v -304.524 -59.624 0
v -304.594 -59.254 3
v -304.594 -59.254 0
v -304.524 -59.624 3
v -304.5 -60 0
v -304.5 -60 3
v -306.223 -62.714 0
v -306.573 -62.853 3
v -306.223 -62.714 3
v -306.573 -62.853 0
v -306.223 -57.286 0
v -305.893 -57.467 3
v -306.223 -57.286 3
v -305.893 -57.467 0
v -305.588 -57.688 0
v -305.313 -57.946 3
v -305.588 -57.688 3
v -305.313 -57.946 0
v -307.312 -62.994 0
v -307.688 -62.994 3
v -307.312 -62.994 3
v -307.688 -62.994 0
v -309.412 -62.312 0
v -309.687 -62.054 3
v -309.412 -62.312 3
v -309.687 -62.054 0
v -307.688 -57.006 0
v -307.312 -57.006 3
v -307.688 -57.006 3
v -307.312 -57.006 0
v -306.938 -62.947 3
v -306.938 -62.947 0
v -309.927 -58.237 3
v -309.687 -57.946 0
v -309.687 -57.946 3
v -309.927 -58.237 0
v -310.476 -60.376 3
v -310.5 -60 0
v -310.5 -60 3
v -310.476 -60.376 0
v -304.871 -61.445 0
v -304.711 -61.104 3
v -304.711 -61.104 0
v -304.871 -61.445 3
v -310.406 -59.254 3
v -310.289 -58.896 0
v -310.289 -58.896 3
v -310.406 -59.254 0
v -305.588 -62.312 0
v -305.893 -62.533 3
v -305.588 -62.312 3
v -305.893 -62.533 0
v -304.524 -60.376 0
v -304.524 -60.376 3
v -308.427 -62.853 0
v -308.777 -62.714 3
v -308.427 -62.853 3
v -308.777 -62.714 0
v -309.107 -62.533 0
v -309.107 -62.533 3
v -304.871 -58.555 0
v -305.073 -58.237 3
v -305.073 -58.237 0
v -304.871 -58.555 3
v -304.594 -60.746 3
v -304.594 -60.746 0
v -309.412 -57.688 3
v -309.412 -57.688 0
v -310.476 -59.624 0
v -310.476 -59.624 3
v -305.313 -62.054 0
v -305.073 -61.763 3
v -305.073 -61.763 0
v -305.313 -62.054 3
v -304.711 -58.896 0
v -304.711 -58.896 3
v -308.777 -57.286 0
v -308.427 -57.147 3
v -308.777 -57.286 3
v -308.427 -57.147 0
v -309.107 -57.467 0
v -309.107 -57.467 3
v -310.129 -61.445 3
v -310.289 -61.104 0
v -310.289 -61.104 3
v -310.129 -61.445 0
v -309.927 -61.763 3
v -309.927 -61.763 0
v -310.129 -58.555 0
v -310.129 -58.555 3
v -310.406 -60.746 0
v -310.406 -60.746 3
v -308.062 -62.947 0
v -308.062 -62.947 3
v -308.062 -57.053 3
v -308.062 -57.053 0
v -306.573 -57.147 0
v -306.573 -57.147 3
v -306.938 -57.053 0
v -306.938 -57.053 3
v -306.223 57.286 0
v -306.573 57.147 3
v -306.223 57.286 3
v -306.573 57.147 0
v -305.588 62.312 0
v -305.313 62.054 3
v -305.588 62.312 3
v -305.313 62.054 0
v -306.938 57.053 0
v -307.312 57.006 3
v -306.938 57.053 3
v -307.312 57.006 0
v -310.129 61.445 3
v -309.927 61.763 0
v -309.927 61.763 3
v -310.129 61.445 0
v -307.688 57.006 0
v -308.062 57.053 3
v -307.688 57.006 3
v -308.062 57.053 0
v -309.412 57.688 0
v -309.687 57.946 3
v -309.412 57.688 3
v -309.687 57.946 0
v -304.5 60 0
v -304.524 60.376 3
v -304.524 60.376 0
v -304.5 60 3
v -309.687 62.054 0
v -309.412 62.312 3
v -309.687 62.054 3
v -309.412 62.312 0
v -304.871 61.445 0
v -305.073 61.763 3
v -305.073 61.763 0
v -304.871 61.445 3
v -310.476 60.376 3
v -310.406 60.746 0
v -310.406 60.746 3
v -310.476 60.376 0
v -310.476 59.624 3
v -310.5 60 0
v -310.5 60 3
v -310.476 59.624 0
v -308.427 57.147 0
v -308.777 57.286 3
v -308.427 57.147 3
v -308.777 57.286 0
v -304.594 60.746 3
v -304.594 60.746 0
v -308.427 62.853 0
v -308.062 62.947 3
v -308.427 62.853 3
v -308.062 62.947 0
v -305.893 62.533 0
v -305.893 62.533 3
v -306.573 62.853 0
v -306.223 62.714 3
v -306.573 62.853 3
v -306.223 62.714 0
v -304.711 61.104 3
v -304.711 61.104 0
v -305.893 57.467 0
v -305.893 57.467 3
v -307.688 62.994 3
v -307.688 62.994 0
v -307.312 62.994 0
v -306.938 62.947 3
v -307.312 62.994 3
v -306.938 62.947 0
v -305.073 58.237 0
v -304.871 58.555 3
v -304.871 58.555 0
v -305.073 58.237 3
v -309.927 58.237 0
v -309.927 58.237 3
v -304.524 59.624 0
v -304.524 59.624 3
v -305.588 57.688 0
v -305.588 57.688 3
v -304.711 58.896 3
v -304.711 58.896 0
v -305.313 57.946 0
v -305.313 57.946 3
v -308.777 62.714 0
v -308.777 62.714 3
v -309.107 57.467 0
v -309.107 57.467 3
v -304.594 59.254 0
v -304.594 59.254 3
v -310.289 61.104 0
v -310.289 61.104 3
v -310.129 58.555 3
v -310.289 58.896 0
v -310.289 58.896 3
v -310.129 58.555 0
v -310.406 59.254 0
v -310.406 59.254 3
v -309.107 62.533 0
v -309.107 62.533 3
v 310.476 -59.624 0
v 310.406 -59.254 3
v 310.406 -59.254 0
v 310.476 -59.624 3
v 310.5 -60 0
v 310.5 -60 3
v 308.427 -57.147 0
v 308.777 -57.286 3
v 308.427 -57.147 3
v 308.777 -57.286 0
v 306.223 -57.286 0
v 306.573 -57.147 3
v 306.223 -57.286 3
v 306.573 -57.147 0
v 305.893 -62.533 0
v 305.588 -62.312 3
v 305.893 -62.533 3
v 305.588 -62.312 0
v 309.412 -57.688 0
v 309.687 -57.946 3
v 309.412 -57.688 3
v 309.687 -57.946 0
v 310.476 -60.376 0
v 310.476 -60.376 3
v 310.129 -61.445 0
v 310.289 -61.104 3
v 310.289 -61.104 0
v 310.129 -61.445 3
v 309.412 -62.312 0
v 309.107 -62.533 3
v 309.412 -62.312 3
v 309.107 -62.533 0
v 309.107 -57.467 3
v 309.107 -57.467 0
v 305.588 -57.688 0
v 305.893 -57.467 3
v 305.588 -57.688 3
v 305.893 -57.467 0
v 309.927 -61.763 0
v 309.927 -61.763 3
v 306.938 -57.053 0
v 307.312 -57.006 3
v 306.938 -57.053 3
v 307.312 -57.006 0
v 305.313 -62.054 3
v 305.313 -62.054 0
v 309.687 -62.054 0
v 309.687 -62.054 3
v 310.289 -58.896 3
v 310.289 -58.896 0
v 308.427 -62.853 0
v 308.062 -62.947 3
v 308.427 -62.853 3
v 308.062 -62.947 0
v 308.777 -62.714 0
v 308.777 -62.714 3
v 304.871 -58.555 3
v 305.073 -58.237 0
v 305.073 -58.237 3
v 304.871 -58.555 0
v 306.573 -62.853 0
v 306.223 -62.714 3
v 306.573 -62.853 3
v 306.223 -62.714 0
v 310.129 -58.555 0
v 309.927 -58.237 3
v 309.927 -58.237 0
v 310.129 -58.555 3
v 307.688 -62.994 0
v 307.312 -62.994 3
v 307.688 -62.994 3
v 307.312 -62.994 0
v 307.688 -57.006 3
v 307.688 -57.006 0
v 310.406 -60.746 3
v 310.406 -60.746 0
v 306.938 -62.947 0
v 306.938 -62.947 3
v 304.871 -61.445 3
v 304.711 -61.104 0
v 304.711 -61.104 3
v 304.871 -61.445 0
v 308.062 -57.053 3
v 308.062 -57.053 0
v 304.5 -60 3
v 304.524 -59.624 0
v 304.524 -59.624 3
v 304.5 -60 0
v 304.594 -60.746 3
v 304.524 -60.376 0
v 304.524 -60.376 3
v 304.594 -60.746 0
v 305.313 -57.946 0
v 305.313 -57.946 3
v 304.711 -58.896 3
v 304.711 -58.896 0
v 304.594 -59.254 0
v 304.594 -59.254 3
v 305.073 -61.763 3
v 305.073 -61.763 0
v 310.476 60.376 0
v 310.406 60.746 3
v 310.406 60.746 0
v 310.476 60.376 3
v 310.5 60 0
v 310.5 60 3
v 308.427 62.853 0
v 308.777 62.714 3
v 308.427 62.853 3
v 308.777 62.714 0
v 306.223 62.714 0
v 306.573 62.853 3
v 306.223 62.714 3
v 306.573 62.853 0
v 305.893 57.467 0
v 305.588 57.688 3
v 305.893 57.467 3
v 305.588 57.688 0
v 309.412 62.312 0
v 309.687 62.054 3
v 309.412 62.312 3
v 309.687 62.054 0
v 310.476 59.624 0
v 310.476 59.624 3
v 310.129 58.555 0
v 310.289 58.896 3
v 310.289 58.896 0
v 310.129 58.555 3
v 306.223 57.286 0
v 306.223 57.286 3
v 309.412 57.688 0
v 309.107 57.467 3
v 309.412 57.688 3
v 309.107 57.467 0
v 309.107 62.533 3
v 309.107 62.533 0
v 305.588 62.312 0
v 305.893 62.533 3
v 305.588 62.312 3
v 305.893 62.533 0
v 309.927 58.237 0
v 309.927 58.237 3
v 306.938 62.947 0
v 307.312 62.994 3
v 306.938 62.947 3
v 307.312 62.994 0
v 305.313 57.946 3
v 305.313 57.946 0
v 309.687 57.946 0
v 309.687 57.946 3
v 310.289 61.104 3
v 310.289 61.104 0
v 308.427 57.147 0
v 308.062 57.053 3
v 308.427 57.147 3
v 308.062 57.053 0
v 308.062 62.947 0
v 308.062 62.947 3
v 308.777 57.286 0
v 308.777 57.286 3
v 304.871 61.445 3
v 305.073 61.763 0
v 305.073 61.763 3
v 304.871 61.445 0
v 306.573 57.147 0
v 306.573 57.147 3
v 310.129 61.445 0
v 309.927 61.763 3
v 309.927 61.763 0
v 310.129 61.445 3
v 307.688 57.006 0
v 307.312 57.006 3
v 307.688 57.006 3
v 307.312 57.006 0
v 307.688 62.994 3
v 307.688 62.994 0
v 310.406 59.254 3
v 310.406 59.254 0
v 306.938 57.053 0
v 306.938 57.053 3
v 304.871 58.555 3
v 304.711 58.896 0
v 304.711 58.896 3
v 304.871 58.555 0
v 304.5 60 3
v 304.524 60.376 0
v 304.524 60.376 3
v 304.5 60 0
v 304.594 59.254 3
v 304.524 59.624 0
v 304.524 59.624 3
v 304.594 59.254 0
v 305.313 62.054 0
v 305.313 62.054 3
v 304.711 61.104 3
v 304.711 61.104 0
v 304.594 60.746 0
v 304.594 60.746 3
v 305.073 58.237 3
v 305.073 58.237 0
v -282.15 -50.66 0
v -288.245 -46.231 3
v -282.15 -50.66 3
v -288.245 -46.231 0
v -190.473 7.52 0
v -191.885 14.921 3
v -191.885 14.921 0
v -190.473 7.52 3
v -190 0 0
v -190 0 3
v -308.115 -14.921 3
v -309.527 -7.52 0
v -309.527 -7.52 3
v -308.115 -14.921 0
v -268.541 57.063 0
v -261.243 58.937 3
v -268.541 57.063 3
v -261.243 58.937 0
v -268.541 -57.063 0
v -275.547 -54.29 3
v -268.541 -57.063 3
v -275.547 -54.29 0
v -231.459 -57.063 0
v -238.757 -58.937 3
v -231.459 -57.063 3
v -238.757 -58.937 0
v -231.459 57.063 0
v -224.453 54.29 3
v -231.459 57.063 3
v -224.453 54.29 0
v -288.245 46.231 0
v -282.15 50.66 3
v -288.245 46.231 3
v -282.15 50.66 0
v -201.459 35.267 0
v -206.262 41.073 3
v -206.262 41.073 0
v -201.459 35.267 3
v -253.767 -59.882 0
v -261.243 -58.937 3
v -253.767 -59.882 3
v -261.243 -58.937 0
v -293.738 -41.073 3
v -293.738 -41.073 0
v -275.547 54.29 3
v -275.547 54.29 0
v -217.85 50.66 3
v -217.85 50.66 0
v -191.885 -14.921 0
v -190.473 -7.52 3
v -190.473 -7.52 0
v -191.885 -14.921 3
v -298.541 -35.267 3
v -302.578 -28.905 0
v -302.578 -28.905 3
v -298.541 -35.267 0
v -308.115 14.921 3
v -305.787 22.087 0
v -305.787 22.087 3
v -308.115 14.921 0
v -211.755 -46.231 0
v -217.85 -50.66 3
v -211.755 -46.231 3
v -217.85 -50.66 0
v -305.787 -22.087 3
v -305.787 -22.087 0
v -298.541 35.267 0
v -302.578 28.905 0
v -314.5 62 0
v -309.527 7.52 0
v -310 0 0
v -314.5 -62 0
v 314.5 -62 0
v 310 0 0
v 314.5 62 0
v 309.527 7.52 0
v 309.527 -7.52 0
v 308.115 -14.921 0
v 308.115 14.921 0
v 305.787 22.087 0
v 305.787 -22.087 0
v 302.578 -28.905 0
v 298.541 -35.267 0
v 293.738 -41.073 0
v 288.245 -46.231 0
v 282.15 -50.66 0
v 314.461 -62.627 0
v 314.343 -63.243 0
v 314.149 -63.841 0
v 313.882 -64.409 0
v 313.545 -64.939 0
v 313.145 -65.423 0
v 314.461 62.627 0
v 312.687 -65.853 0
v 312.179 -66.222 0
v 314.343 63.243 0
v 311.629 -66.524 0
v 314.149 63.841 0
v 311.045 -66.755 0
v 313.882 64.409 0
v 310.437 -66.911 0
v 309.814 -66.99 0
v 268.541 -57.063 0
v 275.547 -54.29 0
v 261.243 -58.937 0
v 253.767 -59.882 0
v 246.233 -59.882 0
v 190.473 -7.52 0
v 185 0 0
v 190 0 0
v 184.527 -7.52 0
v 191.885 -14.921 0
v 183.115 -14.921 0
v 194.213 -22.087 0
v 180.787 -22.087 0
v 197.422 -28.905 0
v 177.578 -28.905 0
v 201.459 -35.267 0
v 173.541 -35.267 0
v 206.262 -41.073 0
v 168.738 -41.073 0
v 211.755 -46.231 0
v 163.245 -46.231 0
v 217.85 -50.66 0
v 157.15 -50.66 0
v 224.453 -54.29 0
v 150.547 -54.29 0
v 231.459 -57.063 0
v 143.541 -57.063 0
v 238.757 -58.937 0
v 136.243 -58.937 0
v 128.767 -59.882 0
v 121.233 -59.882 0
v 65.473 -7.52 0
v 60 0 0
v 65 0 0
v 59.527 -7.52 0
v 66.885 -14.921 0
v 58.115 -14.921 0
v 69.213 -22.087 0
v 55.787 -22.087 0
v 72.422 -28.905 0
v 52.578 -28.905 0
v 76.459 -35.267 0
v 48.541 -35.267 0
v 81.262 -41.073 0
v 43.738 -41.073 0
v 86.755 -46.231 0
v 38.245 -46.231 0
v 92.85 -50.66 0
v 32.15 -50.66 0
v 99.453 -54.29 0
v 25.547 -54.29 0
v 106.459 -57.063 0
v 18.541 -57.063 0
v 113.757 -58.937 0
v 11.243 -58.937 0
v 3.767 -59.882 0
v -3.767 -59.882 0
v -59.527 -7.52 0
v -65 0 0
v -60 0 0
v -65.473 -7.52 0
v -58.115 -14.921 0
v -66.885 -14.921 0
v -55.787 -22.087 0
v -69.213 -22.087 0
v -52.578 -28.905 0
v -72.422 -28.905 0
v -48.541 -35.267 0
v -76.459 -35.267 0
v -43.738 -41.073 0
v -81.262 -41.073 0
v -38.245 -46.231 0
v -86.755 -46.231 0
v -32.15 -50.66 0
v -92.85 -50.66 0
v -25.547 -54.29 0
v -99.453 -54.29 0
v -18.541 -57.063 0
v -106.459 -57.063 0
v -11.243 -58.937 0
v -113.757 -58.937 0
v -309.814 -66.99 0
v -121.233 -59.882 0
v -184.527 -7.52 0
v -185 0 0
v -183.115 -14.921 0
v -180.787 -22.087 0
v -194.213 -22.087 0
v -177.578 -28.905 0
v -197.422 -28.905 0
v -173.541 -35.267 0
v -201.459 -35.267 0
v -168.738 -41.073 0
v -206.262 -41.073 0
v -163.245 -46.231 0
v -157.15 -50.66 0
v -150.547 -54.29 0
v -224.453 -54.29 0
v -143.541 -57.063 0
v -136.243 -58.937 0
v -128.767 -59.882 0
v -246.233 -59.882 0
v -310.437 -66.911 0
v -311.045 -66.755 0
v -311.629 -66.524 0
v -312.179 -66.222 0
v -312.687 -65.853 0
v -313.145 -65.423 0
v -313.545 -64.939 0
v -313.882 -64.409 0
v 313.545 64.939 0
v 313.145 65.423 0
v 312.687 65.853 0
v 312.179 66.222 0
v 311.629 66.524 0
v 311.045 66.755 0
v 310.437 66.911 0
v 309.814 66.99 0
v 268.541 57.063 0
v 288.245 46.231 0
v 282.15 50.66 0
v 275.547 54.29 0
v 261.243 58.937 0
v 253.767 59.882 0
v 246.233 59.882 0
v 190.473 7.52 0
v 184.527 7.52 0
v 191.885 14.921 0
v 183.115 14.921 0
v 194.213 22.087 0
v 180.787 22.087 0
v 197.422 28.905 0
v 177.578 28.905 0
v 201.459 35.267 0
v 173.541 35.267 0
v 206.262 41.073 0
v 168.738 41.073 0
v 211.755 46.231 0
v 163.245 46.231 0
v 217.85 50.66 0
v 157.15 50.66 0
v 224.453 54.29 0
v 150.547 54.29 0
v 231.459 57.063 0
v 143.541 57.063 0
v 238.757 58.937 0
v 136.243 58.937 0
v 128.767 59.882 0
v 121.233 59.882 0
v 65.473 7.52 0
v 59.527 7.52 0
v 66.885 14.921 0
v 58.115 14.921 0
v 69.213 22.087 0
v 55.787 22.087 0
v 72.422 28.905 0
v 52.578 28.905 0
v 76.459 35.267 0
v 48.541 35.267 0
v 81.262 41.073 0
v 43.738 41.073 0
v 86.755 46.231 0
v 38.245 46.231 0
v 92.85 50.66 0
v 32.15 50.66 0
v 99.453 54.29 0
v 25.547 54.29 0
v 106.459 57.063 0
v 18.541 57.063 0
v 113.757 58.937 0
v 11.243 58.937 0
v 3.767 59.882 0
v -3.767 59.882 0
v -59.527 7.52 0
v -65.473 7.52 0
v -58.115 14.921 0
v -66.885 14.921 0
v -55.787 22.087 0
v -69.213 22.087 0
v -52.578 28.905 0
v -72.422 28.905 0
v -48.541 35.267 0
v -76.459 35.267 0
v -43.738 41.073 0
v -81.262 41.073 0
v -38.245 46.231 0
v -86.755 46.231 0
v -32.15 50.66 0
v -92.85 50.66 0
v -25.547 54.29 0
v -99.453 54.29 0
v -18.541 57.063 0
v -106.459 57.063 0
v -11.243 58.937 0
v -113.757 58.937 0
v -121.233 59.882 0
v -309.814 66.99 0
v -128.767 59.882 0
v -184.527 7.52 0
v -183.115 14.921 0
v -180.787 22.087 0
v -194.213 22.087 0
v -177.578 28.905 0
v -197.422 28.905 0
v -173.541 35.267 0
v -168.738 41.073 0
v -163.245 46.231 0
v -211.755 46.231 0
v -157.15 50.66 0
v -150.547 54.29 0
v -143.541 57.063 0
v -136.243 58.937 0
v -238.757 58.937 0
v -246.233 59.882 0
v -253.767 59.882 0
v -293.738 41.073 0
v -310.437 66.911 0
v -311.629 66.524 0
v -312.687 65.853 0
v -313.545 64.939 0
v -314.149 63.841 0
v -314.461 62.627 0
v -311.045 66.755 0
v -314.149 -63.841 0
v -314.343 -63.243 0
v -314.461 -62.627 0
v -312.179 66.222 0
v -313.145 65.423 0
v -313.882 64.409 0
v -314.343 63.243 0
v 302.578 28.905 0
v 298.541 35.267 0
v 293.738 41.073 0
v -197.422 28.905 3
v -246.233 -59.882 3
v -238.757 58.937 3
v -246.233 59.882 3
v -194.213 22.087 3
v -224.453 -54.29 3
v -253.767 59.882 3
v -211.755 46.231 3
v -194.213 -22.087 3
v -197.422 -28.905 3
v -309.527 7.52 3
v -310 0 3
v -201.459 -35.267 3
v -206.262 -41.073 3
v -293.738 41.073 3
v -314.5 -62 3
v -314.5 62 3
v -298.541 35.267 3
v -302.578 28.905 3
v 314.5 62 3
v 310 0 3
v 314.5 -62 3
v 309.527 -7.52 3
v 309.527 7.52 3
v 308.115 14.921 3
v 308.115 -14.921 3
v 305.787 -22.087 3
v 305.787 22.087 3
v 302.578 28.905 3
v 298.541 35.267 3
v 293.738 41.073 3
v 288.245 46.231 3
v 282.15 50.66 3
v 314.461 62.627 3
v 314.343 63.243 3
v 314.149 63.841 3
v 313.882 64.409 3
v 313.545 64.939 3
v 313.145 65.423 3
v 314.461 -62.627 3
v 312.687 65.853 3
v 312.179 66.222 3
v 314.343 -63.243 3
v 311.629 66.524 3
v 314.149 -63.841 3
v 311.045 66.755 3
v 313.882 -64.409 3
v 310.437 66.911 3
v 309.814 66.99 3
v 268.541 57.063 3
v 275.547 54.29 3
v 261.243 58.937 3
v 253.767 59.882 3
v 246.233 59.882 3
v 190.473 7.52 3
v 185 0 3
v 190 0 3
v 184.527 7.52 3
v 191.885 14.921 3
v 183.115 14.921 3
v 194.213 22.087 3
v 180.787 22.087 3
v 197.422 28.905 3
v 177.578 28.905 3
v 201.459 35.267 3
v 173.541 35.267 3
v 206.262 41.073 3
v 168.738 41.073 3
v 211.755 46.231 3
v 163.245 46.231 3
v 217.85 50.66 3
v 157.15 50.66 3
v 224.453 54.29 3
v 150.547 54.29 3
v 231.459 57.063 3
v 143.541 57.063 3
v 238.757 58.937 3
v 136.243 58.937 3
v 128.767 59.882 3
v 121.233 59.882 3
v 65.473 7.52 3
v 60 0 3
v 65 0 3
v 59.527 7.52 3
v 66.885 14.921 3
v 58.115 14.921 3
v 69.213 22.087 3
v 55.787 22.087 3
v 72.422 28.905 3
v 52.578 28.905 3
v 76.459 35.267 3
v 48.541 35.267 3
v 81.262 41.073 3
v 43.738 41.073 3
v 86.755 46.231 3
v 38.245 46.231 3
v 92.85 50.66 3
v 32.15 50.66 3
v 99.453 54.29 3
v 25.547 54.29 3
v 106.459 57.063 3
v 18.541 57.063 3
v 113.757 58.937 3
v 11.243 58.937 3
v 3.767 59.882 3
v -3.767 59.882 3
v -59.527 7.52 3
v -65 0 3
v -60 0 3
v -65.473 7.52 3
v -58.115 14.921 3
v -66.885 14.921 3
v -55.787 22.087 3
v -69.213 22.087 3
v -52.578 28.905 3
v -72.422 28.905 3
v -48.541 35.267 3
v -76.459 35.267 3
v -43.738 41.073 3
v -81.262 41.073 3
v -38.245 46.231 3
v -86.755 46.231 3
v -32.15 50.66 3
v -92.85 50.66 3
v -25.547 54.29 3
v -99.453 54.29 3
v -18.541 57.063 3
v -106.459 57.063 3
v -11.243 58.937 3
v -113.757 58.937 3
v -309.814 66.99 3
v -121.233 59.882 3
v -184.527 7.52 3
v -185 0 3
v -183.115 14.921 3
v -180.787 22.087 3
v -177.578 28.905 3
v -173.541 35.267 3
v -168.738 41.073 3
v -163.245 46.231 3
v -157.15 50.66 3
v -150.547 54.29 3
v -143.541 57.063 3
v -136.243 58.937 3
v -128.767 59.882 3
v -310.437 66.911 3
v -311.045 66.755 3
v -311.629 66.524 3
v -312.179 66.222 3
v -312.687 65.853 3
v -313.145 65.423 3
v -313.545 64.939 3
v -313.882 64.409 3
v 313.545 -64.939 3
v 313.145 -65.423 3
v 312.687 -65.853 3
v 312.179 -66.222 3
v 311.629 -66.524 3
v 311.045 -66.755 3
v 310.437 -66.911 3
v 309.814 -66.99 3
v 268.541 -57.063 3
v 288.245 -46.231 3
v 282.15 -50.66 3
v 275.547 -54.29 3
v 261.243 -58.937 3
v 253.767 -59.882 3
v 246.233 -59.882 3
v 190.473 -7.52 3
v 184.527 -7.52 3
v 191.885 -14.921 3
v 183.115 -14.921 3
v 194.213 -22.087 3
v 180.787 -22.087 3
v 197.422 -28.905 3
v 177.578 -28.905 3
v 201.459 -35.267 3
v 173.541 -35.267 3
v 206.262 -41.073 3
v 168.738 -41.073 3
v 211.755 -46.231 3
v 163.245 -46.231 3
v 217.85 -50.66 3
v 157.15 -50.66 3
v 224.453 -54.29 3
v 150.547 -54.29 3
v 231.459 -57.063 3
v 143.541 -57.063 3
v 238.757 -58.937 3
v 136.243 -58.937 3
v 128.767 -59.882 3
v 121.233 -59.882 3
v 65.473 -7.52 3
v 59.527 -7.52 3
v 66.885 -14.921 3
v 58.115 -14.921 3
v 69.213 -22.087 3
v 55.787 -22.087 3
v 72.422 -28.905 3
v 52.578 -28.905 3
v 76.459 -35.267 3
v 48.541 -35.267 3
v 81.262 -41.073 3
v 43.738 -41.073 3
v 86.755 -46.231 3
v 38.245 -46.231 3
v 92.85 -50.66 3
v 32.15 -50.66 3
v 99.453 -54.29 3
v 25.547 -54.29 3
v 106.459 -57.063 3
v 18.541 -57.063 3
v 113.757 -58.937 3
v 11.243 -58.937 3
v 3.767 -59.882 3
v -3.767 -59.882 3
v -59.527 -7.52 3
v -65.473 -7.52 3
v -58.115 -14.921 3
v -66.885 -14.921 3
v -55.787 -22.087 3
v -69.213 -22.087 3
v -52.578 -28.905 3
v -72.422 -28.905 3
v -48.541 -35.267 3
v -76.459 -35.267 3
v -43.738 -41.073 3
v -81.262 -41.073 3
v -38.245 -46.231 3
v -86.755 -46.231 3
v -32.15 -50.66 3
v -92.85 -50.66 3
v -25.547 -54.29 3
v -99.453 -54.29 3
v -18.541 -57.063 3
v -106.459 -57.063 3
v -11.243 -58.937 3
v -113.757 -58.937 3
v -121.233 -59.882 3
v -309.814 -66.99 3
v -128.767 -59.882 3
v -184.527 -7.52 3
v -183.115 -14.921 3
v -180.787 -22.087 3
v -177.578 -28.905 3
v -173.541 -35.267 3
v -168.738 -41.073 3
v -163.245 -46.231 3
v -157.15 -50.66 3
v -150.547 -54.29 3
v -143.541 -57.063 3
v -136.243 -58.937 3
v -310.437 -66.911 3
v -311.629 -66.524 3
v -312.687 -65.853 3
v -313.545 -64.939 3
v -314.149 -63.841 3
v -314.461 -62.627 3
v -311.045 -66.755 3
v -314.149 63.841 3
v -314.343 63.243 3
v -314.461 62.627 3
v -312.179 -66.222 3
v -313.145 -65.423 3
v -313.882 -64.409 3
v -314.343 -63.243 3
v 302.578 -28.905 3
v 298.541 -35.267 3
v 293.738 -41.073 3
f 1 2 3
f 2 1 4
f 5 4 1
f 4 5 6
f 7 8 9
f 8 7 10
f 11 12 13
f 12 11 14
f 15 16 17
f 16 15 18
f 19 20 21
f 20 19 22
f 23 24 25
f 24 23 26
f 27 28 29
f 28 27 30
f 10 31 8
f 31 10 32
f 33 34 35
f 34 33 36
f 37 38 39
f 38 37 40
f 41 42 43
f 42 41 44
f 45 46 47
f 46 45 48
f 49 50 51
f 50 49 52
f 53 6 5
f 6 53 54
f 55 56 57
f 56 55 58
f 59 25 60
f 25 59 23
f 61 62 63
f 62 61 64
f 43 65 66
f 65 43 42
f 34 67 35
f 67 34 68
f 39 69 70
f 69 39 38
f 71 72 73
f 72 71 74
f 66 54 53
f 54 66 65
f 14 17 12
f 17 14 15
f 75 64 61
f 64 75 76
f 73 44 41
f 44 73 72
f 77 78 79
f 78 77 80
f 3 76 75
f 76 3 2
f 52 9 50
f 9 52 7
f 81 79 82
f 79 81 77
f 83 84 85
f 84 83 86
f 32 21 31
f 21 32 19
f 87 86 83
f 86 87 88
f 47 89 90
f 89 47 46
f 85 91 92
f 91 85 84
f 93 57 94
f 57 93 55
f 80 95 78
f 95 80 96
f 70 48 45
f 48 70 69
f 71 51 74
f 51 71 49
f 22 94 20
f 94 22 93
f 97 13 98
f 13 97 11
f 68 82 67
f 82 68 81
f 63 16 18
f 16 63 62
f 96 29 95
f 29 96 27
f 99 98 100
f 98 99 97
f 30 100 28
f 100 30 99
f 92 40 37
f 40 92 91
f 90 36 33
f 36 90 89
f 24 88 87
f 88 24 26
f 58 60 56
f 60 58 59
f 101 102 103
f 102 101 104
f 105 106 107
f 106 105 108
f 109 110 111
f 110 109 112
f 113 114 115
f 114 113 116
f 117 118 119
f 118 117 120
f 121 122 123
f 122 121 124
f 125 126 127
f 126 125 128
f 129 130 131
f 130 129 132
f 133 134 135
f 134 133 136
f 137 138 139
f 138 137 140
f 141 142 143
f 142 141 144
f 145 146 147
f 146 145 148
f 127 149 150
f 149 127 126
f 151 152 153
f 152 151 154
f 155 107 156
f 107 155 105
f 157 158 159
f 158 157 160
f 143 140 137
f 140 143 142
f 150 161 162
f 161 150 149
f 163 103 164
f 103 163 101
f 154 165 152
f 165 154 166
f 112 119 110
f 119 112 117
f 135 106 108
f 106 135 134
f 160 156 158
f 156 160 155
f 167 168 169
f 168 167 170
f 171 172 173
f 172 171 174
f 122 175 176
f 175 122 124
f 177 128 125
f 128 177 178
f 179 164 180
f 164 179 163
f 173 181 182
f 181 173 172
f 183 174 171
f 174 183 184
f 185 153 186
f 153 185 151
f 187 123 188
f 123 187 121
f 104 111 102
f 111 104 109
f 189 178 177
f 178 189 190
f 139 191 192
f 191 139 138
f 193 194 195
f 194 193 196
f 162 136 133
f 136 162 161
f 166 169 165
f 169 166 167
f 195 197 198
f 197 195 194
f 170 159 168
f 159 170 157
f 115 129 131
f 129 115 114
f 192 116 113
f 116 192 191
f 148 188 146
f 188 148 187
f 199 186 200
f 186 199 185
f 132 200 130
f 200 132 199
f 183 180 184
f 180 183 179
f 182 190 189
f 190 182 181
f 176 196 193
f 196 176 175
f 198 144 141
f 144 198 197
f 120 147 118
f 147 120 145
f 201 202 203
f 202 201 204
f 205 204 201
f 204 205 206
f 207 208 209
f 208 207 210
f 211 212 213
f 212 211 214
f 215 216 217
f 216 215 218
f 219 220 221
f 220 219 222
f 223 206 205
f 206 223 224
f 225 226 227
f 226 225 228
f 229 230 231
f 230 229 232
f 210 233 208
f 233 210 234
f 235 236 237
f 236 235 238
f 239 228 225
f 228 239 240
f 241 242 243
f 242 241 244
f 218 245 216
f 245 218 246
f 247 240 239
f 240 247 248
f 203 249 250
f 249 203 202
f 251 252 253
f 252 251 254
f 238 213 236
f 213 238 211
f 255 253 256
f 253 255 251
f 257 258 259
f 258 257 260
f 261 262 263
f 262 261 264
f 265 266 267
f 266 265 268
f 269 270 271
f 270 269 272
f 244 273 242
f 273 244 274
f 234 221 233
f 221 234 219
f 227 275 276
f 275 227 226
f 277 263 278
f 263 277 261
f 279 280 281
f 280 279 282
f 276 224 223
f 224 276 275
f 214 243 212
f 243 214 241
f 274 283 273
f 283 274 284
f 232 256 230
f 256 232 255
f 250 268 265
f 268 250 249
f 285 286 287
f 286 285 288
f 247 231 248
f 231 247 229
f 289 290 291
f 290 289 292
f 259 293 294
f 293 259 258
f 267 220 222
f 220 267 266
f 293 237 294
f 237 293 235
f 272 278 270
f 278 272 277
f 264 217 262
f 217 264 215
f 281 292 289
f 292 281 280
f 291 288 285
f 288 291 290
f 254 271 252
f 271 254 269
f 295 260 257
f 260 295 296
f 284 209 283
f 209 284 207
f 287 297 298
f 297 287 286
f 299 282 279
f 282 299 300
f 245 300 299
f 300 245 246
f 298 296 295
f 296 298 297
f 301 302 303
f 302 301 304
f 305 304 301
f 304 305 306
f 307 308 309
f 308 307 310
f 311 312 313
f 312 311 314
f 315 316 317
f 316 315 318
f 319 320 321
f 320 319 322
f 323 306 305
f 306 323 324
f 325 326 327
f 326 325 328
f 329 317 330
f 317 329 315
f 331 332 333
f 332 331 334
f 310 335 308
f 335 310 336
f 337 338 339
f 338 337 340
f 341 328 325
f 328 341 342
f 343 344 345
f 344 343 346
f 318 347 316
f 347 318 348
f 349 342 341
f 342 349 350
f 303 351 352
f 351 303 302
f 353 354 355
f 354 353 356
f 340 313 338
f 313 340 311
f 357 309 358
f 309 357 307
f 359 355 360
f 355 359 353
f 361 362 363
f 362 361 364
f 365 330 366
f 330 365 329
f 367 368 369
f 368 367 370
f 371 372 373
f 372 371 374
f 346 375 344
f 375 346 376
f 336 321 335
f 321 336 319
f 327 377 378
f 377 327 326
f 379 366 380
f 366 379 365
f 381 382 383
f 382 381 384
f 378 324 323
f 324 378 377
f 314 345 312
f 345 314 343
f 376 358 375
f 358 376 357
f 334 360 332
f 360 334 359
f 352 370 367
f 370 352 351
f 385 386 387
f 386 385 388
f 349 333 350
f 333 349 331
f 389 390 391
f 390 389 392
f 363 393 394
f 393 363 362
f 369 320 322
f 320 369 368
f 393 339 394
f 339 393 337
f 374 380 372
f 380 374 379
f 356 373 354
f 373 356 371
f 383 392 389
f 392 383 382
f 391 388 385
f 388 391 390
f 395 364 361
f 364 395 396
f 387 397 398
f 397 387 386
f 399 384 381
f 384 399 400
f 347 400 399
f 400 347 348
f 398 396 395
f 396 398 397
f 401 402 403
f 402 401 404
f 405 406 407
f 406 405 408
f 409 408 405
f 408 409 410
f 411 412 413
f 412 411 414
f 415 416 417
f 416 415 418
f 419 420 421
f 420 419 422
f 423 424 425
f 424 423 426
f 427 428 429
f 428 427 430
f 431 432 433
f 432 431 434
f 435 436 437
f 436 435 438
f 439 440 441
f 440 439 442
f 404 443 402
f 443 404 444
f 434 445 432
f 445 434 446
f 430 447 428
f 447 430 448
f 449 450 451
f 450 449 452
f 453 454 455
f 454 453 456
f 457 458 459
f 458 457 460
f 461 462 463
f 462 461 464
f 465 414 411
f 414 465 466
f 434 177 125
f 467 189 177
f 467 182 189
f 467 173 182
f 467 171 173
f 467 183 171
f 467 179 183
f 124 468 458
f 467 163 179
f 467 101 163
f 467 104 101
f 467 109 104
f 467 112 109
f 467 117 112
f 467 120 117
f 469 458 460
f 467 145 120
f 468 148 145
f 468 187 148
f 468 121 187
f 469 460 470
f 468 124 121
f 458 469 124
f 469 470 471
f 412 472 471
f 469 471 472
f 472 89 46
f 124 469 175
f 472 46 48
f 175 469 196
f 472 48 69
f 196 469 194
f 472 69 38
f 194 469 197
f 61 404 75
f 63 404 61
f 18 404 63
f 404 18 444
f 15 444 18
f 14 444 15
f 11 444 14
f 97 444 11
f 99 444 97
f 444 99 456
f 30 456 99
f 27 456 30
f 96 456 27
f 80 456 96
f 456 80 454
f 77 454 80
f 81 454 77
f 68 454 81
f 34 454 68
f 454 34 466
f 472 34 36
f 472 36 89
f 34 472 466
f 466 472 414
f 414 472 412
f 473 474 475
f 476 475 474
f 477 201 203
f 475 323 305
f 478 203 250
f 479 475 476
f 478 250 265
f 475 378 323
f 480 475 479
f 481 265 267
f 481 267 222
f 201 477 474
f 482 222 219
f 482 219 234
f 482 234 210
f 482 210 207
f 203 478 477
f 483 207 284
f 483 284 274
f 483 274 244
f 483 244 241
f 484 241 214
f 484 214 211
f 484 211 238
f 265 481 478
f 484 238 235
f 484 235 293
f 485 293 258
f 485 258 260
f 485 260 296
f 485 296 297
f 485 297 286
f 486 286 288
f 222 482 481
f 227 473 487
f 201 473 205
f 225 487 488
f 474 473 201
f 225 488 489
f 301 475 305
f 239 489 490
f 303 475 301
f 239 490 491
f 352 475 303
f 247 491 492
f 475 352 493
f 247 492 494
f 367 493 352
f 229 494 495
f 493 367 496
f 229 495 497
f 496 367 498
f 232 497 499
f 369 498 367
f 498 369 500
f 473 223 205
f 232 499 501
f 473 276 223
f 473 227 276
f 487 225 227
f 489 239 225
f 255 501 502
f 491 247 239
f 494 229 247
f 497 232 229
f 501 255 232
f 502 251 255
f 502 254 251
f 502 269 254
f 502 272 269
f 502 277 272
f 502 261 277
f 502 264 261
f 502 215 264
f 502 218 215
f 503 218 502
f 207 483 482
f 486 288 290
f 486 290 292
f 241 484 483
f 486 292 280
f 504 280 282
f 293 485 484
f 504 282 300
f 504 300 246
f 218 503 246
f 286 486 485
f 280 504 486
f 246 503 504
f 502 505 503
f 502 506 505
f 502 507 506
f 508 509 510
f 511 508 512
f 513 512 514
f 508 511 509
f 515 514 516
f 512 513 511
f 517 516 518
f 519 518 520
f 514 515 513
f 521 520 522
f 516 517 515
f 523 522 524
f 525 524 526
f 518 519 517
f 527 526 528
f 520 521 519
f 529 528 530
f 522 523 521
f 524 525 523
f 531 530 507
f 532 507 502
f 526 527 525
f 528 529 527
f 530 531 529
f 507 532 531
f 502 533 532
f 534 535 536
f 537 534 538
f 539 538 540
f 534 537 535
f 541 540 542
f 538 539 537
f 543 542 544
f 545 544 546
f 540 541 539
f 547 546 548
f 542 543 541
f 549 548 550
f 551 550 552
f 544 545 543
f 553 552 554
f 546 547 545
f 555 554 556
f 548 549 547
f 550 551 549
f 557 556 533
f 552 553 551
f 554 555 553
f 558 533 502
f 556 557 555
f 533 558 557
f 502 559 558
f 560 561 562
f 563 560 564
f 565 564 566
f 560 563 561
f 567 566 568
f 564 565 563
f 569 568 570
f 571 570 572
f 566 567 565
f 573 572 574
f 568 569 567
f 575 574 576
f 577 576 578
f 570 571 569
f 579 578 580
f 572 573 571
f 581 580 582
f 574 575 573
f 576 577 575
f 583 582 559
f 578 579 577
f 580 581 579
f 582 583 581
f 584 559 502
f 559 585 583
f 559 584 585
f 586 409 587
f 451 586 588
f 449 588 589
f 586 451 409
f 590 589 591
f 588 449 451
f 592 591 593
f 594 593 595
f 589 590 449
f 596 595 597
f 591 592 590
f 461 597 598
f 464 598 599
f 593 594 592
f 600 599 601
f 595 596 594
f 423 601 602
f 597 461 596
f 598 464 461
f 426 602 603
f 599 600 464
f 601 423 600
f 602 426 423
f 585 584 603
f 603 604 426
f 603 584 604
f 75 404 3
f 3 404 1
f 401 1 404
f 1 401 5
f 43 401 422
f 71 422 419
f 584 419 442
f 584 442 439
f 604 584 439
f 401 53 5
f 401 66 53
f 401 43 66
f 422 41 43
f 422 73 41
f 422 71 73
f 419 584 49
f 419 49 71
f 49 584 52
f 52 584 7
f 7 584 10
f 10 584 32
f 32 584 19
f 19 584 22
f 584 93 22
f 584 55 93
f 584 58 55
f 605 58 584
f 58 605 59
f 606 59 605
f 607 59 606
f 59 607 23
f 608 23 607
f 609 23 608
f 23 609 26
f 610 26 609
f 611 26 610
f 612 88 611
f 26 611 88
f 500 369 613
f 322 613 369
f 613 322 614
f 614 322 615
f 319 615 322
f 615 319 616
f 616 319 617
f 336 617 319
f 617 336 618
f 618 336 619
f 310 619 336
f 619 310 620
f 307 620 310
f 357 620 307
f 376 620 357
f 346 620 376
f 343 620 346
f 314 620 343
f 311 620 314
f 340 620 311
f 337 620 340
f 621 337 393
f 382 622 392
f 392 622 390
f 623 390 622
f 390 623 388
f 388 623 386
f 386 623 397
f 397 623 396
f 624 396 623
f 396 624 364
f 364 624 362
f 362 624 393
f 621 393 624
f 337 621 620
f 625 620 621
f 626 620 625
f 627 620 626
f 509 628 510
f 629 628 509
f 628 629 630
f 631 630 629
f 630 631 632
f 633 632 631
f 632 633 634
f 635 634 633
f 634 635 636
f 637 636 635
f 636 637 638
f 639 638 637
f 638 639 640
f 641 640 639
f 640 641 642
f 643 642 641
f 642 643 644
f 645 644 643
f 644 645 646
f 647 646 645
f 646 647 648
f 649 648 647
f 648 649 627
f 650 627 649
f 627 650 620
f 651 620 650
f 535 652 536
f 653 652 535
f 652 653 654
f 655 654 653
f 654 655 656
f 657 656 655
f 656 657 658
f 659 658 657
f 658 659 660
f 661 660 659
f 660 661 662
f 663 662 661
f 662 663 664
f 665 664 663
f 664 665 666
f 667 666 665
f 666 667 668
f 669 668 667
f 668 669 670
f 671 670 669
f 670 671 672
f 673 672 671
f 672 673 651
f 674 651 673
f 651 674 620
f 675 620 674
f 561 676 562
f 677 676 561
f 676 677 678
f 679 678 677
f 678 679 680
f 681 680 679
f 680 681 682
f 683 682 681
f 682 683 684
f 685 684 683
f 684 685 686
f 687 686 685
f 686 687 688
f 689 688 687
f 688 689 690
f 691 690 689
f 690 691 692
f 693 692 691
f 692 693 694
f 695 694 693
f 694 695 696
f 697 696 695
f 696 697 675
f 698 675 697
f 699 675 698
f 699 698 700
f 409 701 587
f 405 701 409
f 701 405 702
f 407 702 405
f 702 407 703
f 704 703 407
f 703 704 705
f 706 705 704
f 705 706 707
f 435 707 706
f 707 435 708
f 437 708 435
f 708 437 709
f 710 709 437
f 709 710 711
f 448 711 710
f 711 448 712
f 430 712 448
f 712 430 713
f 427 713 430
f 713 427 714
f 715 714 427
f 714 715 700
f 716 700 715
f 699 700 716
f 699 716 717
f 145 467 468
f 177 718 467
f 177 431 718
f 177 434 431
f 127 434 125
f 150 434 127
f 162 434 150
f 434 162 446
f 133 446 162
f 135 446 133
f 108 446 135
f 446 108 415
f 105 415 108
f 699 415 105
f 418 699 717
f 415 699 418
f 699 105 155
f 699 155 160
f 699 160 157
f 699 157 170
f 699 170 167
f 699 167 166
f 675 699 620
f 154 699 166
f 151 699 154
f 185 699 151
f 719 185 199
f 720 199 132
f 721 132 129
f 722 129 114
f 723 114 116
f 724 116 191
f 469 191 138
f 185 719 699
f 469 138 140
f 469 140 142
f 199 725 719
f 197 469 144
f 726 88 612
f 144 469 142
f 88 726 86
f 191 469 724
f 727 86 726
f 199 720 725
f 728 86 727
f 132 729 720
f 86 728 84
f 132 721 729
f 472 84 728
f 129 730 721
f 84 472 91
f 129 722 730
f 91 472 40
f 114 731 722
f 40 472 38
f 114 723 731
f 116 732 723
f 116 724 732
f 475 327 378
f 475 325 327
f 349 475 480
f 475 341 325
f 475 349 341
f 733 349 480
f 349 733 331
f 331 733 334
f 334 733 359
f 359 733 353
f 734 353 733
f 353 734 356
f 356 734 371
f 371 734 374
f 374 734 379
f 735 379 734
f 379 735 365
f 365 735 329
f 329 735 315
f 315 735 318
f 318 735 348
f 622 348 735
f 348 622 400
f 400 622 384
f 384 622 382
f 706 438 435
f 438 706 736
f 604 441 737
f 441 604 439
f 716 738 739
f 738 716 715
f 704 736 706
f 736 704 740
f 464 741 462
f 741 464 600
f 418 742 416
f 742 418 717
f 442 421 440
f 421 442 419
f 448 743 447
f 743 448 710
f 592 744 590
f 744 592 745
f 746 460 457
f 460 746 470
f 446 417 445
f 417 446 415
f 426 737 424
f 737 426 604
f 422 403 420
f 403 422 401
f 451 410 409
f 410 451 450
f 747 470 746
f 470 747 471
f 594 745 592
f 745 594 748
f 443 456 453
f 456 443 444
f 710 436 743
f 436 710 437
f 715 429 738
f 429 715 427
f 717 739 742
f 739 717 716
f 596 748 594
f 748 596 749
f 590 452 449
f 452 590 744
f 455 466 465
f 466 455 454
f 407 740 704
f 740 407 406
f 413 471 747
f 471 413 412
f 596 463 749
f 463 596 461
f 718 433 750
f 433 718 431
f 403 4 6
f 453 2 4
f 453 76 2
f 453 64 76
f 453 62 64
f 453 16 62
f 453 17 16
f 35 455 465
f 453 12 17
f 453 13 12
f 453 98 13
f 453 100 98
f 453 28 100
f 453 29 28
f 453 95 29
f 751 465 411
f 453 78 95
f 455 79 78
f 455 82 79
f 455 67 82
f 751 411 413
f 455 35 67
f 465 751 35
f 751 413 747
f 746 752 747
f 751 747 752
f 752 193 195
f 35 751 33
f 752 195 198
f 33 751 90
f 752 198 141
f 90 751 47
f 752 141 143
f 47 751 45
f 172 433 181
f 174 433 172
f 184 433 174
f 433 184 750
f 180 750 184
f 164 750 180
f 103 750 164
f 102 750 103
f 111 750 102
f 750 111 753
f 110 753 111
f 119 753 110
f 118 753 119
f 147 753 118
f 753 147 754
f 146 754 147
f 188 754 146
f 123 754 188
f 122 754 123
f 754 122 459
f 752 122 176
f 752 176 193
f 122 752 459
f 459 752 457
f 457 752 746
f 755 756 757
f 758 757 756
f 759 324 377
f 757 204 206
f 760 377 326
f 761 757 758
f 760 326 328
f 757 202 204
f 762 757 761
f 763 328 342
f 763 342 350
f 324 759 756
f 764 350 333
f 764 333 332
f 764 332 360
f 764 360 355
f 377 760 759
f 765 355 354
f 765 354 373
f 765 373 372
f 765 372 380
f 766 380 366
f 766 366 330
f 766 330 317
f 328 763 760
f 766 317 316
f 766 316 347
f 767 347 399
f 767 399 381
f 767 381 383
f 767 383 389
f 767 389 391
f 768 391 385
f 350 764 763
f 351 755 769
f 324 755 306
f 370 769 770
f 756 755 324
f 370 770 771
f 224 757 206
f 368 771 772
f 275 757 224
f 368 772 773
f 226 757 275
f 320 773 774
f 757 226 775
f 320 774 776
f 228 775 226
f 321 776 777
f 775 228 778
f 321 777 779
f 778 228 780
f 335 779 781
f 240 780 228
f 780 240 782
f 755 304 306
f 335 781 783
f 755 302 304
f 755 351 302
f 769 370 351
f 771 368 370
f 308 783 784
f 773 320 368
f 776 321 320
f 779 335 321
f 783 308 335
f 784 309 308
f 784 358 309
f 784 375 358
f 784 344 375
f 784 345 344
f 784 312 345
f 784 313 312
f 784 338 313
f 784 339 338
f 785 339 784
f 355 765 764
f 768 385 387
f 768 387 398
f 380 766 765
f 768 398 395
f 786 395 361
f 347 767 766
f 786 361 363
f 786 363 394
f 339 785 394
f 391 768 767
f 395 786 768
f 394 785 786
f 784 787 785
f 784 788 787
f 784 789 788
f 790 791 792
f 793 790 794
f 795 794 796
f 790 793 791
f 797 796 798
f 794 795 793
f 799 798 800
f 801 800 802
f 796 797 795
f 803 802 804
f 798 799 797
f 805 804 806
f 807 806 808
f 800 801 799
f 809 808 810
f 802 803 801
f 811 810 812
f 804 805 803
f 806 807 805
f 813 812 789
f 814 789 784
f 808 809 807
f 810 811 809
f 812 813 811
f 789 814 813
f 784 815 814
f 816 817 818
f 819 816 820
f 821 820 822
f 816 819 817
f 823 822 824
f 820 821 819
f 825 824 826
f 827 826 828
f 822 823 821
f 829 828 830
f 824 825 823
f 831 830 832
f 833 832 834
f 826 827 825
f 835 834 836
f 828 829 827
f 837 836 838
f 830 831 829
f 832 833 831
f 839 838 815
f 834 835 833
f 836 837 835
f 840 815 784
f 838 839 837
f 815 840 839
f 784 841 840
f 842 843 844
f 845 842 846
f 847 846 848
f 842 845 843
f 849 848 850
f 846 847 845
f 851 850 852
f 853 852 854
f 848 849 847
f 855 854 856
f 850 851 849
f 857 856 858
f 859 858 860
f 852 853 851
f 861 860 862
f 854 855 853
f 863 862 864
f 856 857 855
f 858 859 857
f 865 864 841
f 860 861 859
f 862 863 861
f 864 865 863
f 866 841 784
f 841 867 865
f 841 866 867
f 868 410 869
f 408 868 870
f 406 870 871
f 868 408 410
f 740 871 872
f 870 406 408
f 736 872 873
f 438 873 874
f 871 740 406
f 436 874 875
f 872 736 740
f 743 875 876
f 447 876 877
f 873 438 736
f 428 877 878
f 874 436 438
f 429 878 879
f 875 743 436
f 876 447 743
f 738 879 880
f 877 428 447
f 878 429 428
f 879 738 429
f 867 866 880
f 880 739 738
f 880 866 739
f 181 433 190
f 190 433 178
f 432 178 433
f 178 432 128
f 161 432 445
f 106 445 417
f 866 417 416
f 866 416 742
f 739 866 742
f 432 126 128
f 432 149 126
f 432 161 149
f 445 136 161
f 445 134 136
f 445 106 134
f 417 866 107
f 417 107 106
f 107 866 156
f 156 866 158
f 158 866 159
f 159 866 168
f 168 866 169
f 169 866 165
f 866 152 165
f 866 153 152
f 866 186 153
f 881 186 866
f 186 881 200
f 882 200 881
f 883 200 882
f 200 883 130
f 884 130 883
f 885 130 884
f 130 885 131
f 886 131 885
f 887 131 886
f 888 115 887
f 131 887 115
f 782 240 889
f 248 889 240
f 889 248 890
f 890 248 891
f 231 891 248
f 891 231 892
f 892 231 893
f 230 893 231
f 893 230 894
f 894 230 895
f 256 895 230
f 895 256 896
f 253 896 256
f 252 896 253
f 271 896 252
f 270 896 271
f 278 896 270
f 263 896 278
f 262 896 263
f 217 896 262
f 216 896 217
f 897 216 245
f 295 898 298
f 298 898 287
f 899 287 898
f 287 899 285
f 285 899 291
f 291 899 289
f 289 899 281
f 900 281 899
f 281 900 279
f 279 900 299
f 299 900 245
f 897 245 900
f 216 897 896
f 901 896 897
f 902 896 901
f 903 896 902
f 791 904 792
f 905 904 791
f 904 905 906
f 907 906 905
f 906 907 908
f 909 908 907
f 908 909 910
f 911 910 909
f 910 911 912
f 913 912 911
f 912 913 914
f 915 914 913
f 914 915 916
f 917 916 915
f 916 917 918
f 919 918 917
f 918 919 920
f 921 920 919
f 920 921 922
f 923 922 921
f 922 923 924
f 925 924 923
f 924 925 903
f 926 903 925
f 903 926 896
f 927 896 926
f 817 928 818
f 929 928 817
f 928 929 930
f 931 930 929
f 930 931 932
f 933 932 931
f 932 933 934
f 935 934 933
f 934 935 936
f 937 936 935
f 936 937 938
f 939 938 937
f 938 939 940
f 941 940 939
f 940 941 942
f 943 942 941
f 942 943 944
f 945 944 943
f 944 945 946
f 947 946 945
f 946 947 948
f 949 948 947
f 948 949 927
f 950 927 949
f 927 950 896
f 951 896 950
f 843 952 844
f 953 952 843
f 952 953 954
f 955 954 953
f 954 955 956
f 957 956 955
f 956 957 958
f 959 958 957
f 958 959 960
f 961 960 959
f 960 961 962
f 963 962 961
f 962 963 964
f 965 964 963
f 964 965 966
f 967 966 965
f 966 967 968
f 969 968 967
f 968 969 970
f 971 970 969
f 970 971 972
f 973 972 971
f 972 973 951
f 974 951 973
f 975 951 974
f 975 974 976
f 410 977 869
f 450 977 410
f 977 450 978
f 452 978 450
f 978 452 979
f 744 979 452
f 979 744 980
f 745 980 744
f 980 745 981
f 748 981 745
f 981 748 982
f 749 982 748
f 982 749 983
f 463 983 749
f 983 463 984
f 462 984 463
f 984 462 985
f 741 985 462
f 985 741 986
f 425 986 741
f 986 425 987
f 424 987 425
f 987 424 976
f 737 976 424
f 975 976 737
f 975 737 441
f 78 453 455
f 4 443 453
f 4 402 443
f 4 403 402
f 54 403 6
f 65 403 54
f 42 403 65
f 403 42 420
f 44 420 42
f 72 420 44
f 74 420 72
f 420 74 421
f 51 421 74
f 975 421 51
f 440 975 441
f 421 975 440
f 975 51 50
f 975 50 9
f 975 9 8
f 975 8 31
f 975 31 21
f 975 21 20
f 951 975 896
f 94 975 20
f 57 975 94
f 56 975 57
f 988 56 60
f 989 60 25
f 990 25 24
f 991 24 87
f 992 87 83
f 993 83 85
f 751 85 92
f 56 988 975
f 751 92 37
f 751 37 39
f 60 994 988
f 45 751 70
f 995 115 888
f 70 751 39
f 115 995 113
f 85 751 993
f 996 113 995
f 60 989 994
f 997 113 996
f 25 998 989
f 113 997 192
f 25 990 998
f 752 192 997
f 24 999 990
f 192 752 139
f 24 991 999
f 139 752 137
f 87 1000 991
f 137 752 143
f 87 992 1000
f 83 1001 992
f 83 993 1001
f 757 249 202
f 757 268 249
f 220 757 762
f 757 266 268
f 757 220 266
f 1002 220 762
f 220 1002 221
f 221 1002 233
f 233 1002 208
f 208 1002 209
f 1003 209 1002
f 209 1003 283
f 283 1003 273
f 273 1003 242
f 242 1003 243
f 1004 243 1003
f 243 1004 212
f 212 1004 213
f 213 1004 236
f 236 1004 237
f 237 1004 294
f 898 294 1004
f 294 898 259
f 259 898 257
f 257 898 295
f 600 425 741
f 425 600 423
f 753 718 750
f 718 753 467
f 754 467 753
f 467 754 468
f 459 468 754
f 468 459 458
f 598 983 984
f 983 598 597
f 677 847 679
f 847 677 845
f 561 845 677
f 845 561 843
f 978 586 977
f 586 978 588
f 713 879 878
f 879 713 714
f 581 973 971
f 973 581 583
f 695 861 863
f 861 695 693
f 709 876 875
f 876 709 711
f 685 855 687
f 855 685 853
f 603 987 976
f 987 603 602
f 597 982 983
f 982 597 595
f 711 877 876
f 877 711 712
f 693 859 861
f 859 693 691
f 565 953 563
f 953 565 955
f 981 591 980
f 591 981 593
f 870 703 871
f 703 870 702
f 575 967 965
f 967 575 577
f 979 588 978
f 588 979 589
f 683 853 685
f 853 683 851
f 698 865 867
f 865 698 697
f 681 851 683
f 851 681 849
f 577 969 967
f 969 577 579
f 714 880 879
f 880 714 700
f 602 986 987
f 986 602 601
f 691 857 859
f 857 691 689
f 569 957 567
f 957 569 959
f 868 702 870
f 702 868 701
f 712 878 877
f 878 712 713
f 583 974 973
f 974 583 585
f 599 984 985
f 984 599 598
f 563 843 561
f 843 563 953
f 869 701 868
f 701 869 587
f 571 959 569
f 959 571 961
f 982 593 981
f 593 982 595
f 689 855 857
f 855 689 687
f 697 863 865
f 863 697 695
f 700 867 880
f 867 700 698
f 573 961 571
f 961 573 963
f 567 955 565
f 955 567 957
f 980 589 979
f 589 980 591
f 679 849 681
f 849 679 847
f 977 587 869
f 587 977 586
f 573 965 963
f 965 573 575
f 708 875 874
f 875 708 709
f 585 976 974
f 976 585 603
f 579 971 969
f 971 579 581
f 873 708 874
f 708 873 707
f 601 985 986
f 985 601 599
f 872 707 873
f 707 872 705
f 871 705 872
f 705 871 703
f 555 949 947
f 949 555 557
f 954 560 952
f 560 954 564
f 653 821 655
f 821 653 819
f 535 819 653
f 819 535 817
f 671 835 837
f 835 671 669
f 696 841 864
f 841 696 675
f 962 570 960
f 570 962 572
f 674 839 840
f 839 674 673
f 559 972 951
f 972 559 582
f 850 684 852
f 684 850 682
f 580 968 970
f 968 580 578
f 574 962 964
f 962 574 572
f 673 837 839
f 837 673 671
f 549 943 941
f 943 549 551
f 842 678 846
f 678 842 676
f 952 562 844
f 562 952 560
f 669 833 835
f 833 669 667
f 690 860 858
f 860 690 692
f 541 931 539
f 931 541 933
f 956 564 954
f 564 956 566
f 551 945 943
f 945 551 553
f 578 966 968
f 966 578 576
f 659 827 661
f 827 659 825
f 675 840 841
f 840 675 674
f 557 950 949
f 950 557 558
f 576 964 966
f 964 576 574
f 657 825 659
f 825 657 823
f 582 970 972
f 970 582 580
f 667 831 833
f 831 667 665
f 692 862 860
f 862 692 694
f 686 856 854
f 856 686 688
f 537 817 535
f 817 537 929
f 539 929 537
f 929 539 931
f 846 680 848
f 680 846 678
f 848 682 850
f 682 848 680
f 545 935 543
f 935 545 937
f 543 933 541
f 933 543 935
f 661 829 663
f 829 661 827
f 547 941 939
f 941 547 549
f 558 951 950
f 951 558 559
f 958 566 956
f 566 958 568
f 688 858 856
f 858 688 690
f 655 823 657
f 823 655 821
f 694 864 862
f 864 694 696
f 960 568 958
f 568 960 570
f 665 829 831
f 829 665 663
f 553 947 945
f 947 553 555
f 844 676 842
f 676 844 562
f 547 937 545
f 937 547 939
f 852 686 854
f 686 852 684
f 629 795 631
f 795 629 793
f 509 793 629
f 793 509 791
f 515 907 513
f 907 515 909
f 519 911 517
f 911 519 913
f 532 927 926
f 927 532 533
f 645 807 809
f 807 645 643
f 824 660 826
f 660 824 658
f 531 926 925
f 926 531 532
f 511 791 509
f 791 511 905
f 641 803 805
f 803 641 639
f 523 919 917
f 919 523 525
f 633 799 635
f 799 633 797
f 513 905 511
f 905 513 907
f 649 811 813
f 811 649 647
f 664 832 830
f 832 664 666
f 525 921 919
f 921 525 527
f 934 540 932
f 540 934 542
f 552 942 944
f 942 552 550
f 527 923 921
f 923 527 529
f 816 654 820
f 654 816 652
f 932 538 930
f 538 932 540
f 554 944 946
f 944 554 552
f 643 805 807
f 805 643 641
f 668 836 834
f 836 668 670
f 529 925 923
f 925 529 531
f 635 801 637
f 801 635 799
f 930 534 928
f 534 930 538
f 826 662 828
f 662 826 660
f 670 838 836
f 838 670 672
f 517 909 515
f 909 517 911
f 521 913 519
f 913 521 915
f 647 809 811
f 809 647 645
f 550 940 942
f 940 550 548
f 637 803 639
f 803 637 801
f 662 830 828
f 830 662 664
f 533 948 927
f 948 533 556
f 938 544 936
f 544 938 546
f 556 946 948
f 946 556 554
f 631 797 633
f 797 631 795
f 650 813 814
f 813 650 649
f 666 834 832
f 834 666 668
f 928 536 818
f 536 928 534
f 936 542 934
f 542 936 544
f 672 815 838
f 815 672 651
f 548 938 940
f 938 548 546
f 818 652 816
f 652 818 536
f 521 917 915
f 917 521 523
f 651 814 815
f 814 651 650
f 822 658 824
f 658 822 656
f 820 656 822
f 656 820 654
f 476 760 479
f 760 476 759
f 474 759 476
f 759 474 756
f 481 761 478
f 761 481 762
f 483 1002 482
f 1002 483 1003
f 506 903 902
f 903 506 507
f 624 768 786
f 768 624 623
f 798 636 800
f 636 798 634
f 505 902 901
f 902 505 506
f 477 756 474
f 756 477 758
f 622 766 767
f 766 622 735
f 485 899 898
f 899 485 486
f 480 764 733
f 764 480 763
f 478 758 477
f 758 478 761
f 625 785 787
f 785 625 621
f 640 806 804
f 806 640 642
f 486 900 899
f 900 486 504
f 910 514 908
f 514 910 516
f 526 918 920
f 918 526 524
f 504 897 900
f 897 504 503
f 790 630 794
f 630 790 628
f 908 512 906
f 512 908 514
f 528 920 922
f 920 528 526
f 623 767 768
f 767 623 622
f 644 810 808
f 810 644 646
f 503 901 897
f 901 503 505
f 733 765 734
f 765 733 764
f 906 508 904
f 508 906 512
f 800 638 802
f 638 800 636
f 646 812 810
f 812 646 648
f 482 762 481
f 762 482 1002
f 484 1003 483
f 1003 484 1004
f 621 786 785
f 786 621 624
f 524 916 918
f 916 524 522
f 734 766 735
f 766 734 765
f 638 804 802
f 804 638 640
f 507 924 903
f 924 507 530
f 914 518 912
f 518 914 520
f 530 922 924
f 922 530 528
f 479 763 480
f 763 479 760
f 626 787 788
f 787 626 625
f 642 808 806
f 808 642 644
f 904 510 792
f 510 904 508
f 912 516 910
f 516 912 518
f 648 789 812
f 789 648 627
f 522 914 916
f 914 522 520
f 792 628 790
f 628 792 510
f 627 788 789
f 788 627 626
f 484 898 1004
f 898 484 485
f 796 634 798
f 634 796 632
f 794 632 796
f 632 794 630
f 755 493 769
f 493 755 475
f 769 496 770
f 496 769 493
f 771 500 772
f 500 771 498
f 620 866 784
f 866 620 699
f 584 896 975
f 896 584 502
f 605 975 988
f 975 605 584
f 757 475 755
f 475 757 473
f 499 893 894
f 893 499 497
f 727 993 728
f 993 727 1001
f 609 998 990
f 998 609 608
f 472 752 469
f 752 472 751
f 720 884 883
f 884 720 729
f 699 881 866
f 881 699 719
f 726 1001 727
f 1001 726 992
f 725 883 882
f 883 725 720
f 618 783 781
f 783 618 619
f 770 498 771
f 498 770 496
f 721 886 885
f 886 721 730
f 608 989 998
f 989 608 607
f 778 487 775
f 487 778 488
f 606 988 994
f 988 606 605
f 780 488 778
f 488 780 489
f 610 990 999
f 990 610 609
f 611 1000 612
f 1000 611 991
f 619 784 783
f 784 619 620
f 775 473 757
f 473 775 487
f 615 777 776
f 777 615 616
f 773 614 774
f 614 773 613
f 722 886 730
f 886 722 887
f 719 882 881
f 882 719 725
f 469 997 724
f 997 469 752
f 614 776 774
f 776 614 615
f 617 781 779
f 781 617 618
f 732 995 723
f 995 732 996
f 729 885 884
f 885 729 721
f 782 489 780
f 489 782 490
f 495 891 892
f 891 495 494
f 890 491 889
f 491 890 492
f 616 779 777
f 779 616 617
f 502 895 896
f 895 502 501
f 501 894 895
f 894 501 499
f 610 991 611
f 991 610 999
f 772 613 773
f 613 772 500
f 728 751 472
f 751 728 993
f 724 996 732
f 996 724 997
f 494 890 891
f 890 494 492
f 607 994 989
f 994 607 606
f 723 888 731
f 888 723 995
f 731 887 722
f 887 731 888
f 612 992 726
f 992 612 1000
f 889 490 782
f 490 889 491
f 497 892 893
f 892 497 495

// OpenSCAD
$fn = 50;


difference() {
	union() {
		hull() {
			translate(v = [-309.5000000000, 62.0000000000, 0]) {
				cylinder(h = 3, r = 5);
			}
			translate(v = [309.5000000000, 62.0000000000, 0]) {
				cylinder(h = 3, r = 5);
			}
			translate(v = [-309.5000000000, -62.0000000000, 0]) {
				cylinder(h = 3, r = 5);
			}
			translate(v = [309.5000000000, -62.0000000000, 0]) {
				cylinder(h = 3, r = 5);
			}
		}
	}
	union() {
		#translate(v = [-307.5000000000, -60.0000000000, -100.0000000000]) {
			cylinder(h = 200, r = 3.0000000000);
		}
		#translate(v = [-307.5000000000, 60.0000000000, -100.0000000000]) {
			cylinder(h = 200, r = 3.0000000000);
		}
		#translate(v = [307.5000000000, -60.0000000000, -100.0000000000]) {
			cylinder(h = 200, r = 3.0000000000);
		}
		#translate(v = [307.5000000000, 60.0000000000, -100.0000000000]) {
			cylinder(h = 200, r = 3.0000000000);
		}
		#translate(v = [-250.0000000000, 0, 0]) {
			cylinder(h = 3, r = 60.0000000000);
		}
		#translate(v = [-125.0000000000, 0, 0]) {
			cylinder(h = 3, r = 60.0000000000);
		}
		#cylinder(h = 3, r = 60.0000000000);
		#translate(v = [125.0000000000, 0, 0]) {
			cylinder(h = 3, r = 60.0000000000);
		}
		#translate(v = [250.0000000000, 0, 0]) {
			cylinder(h = 3, r = 60.0000000000);
		}
	}
}
